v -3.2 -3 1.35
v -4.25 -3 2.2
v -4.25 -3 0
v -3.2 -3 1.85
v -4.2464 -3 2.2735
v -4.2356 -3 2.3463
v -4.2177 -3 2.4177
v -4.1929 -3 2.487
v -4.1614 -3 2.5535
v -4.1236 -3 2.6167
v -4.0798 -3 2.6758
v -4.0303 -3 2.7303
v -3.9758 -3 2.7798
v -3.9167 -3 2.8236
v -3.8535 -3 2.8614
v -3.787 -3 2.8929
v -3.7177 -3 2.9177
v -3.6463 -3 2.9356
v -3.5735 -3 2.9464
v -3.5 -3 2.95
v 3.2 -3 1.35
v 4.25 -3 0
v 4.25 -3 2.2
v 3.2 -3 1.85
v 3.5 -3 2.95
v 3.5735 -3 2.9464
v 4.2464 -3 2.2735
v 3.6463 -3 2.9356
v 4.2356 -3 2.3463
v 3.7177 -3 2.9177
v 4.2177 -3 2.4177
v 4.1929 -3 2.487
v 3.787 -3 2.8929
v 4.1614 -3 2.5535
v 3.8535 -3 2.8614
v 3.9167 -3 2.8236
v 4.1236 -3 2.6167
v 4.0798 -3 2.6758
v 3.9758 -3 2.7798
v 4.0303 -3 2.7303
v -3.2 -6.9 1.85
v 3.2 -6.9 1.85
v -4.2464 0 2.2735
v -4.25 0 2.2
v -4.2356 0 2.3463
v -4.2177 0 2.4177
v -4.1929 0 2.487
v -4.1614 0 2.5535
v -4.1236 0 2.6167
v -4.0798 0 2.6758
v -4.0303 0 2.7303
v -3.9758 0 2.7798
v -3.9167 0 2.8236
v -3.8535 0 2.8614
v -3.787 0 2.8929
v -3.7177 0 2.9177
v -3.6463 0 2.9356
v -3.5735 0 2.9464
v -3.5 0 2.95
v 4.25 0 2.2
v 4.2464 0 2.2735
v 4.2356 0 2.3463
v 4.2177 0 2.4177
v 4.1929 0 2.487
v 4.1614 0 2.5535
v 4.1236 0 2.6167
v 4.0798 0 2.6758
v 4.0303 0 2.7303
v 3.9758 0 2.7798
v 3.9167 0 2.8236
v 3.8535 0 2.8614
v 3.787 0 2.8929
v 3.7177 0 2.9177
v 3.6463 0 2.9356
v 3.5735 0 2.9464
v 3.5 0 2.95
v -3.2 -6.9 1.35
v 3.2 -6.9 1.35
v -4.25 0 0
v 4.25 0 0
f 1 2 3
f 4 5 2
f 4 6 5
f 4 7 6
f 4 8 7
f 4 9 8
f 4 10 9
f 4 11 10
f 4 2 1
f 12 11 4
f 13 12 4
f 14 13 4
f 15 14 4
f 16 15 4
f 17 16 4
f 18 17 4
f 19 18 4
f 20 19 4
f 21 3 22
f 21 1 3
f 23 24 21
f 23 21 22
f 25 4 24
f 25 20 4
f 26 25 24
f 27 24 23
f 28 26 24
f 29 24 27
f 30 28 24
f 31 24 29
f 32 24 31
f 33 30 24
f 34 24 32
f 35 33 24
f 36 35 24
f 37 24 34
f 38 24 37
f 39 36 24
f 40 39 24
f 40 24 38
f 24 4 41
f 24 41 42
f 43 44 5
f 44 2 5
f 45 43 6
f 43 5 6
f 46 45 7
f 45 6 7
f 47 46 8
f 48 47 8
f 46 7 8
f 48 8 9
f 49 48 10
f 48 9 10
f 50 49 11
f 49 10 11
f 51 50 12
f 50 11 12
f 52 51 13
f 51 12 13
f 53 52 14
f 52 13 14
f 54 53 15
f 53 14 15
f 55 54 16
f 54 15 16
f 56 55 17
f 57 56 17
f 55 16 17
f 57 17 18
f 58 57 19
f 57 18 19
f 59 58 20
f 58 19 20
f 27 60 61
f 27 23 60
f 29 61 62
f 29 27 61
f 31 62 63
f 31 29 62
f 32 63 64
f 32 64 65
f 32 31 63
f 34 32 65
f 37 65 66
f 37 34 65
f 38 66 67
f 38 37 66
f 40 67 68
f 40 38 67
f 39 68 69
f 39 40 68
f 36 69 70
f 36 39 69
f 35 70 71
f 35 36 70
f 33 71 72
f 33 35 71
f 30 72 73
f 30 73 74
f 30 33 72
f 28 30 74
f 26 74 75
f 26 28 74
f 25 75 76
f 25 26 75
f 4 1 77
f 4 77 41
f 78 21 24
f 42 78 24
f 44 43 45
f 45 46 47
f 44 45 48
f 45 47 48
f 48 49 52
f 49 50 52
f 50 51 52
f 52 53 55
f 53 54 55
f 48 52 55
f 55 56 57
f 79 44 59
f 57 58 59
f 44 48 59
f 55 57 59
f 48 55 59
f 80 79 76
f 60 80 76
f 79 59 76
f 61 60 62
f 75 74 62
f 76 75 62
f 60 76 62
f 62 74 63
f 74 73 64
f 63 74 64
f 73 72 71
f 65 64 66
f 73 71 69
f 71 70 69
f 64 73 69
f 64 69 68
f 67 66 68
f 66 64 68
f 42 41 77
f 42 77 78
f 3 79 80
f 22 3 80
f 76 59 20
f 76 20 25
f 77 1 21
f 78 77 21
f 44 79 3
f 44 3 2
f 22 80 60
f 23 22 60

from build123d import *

# Parameters (mm, degrees)
BOX001_W                  = 6.4
BOX001_H                  = 0.5
BOX001_DEPTH              = 6.9
BOX067_W                  = 8.5
BOX067_H                  = 2.95
BOX067_DEPTH              = 3
FILLET017_R               = 0.75
FUSION051_PLACEMENT_ANGLE = 90


with BuildPart() as cube043:
    # Box001 → Box001 (new body)
    with BuildSketch(Plane(origin=(-3.2, 1.35, 0), x_dir=(1, 0, 0), z_dir=(0, 0, 1))):
        with Locations((3.2, 0.25)):
            Rectangle(BOX001_W, BOX001_H)
    extrude(amount=BOX001_DEPTH)


with BuildPart() as body013:
    # Box067 → Box067 (new body)
    with BuildSketch(Plane(origin=(-4.25, 0, 0), x_dir=(1, 0, 0), z_dir=(0, 0, 1))):
        with Locations((4.25, 1.475)):
            Rectangle(BOX067_W, BOX067_H)
    extrude(amount=BOX067_DEPTH)

    # Fillet017
    fillet017_edges = [body013.edges().sort_by_distance(p)[0] for p in [
        (-4.25, 2.95, 1.5),
        (4.25, 2.95, 1.5),
    ]]
    fillet(fillet017_edges, radius=FILLET017_R)

    # Fusion051: union Cube043
    add(cube043.part)


with BuildPart() as body013_1:
    # Fusion051 placement: moved
    add(body013.part.rotate(Axis((0, 0, 0), (1, 0, 0)), FUSION051_PLACEMENT_ANGLE))


solid = body013_1.part
